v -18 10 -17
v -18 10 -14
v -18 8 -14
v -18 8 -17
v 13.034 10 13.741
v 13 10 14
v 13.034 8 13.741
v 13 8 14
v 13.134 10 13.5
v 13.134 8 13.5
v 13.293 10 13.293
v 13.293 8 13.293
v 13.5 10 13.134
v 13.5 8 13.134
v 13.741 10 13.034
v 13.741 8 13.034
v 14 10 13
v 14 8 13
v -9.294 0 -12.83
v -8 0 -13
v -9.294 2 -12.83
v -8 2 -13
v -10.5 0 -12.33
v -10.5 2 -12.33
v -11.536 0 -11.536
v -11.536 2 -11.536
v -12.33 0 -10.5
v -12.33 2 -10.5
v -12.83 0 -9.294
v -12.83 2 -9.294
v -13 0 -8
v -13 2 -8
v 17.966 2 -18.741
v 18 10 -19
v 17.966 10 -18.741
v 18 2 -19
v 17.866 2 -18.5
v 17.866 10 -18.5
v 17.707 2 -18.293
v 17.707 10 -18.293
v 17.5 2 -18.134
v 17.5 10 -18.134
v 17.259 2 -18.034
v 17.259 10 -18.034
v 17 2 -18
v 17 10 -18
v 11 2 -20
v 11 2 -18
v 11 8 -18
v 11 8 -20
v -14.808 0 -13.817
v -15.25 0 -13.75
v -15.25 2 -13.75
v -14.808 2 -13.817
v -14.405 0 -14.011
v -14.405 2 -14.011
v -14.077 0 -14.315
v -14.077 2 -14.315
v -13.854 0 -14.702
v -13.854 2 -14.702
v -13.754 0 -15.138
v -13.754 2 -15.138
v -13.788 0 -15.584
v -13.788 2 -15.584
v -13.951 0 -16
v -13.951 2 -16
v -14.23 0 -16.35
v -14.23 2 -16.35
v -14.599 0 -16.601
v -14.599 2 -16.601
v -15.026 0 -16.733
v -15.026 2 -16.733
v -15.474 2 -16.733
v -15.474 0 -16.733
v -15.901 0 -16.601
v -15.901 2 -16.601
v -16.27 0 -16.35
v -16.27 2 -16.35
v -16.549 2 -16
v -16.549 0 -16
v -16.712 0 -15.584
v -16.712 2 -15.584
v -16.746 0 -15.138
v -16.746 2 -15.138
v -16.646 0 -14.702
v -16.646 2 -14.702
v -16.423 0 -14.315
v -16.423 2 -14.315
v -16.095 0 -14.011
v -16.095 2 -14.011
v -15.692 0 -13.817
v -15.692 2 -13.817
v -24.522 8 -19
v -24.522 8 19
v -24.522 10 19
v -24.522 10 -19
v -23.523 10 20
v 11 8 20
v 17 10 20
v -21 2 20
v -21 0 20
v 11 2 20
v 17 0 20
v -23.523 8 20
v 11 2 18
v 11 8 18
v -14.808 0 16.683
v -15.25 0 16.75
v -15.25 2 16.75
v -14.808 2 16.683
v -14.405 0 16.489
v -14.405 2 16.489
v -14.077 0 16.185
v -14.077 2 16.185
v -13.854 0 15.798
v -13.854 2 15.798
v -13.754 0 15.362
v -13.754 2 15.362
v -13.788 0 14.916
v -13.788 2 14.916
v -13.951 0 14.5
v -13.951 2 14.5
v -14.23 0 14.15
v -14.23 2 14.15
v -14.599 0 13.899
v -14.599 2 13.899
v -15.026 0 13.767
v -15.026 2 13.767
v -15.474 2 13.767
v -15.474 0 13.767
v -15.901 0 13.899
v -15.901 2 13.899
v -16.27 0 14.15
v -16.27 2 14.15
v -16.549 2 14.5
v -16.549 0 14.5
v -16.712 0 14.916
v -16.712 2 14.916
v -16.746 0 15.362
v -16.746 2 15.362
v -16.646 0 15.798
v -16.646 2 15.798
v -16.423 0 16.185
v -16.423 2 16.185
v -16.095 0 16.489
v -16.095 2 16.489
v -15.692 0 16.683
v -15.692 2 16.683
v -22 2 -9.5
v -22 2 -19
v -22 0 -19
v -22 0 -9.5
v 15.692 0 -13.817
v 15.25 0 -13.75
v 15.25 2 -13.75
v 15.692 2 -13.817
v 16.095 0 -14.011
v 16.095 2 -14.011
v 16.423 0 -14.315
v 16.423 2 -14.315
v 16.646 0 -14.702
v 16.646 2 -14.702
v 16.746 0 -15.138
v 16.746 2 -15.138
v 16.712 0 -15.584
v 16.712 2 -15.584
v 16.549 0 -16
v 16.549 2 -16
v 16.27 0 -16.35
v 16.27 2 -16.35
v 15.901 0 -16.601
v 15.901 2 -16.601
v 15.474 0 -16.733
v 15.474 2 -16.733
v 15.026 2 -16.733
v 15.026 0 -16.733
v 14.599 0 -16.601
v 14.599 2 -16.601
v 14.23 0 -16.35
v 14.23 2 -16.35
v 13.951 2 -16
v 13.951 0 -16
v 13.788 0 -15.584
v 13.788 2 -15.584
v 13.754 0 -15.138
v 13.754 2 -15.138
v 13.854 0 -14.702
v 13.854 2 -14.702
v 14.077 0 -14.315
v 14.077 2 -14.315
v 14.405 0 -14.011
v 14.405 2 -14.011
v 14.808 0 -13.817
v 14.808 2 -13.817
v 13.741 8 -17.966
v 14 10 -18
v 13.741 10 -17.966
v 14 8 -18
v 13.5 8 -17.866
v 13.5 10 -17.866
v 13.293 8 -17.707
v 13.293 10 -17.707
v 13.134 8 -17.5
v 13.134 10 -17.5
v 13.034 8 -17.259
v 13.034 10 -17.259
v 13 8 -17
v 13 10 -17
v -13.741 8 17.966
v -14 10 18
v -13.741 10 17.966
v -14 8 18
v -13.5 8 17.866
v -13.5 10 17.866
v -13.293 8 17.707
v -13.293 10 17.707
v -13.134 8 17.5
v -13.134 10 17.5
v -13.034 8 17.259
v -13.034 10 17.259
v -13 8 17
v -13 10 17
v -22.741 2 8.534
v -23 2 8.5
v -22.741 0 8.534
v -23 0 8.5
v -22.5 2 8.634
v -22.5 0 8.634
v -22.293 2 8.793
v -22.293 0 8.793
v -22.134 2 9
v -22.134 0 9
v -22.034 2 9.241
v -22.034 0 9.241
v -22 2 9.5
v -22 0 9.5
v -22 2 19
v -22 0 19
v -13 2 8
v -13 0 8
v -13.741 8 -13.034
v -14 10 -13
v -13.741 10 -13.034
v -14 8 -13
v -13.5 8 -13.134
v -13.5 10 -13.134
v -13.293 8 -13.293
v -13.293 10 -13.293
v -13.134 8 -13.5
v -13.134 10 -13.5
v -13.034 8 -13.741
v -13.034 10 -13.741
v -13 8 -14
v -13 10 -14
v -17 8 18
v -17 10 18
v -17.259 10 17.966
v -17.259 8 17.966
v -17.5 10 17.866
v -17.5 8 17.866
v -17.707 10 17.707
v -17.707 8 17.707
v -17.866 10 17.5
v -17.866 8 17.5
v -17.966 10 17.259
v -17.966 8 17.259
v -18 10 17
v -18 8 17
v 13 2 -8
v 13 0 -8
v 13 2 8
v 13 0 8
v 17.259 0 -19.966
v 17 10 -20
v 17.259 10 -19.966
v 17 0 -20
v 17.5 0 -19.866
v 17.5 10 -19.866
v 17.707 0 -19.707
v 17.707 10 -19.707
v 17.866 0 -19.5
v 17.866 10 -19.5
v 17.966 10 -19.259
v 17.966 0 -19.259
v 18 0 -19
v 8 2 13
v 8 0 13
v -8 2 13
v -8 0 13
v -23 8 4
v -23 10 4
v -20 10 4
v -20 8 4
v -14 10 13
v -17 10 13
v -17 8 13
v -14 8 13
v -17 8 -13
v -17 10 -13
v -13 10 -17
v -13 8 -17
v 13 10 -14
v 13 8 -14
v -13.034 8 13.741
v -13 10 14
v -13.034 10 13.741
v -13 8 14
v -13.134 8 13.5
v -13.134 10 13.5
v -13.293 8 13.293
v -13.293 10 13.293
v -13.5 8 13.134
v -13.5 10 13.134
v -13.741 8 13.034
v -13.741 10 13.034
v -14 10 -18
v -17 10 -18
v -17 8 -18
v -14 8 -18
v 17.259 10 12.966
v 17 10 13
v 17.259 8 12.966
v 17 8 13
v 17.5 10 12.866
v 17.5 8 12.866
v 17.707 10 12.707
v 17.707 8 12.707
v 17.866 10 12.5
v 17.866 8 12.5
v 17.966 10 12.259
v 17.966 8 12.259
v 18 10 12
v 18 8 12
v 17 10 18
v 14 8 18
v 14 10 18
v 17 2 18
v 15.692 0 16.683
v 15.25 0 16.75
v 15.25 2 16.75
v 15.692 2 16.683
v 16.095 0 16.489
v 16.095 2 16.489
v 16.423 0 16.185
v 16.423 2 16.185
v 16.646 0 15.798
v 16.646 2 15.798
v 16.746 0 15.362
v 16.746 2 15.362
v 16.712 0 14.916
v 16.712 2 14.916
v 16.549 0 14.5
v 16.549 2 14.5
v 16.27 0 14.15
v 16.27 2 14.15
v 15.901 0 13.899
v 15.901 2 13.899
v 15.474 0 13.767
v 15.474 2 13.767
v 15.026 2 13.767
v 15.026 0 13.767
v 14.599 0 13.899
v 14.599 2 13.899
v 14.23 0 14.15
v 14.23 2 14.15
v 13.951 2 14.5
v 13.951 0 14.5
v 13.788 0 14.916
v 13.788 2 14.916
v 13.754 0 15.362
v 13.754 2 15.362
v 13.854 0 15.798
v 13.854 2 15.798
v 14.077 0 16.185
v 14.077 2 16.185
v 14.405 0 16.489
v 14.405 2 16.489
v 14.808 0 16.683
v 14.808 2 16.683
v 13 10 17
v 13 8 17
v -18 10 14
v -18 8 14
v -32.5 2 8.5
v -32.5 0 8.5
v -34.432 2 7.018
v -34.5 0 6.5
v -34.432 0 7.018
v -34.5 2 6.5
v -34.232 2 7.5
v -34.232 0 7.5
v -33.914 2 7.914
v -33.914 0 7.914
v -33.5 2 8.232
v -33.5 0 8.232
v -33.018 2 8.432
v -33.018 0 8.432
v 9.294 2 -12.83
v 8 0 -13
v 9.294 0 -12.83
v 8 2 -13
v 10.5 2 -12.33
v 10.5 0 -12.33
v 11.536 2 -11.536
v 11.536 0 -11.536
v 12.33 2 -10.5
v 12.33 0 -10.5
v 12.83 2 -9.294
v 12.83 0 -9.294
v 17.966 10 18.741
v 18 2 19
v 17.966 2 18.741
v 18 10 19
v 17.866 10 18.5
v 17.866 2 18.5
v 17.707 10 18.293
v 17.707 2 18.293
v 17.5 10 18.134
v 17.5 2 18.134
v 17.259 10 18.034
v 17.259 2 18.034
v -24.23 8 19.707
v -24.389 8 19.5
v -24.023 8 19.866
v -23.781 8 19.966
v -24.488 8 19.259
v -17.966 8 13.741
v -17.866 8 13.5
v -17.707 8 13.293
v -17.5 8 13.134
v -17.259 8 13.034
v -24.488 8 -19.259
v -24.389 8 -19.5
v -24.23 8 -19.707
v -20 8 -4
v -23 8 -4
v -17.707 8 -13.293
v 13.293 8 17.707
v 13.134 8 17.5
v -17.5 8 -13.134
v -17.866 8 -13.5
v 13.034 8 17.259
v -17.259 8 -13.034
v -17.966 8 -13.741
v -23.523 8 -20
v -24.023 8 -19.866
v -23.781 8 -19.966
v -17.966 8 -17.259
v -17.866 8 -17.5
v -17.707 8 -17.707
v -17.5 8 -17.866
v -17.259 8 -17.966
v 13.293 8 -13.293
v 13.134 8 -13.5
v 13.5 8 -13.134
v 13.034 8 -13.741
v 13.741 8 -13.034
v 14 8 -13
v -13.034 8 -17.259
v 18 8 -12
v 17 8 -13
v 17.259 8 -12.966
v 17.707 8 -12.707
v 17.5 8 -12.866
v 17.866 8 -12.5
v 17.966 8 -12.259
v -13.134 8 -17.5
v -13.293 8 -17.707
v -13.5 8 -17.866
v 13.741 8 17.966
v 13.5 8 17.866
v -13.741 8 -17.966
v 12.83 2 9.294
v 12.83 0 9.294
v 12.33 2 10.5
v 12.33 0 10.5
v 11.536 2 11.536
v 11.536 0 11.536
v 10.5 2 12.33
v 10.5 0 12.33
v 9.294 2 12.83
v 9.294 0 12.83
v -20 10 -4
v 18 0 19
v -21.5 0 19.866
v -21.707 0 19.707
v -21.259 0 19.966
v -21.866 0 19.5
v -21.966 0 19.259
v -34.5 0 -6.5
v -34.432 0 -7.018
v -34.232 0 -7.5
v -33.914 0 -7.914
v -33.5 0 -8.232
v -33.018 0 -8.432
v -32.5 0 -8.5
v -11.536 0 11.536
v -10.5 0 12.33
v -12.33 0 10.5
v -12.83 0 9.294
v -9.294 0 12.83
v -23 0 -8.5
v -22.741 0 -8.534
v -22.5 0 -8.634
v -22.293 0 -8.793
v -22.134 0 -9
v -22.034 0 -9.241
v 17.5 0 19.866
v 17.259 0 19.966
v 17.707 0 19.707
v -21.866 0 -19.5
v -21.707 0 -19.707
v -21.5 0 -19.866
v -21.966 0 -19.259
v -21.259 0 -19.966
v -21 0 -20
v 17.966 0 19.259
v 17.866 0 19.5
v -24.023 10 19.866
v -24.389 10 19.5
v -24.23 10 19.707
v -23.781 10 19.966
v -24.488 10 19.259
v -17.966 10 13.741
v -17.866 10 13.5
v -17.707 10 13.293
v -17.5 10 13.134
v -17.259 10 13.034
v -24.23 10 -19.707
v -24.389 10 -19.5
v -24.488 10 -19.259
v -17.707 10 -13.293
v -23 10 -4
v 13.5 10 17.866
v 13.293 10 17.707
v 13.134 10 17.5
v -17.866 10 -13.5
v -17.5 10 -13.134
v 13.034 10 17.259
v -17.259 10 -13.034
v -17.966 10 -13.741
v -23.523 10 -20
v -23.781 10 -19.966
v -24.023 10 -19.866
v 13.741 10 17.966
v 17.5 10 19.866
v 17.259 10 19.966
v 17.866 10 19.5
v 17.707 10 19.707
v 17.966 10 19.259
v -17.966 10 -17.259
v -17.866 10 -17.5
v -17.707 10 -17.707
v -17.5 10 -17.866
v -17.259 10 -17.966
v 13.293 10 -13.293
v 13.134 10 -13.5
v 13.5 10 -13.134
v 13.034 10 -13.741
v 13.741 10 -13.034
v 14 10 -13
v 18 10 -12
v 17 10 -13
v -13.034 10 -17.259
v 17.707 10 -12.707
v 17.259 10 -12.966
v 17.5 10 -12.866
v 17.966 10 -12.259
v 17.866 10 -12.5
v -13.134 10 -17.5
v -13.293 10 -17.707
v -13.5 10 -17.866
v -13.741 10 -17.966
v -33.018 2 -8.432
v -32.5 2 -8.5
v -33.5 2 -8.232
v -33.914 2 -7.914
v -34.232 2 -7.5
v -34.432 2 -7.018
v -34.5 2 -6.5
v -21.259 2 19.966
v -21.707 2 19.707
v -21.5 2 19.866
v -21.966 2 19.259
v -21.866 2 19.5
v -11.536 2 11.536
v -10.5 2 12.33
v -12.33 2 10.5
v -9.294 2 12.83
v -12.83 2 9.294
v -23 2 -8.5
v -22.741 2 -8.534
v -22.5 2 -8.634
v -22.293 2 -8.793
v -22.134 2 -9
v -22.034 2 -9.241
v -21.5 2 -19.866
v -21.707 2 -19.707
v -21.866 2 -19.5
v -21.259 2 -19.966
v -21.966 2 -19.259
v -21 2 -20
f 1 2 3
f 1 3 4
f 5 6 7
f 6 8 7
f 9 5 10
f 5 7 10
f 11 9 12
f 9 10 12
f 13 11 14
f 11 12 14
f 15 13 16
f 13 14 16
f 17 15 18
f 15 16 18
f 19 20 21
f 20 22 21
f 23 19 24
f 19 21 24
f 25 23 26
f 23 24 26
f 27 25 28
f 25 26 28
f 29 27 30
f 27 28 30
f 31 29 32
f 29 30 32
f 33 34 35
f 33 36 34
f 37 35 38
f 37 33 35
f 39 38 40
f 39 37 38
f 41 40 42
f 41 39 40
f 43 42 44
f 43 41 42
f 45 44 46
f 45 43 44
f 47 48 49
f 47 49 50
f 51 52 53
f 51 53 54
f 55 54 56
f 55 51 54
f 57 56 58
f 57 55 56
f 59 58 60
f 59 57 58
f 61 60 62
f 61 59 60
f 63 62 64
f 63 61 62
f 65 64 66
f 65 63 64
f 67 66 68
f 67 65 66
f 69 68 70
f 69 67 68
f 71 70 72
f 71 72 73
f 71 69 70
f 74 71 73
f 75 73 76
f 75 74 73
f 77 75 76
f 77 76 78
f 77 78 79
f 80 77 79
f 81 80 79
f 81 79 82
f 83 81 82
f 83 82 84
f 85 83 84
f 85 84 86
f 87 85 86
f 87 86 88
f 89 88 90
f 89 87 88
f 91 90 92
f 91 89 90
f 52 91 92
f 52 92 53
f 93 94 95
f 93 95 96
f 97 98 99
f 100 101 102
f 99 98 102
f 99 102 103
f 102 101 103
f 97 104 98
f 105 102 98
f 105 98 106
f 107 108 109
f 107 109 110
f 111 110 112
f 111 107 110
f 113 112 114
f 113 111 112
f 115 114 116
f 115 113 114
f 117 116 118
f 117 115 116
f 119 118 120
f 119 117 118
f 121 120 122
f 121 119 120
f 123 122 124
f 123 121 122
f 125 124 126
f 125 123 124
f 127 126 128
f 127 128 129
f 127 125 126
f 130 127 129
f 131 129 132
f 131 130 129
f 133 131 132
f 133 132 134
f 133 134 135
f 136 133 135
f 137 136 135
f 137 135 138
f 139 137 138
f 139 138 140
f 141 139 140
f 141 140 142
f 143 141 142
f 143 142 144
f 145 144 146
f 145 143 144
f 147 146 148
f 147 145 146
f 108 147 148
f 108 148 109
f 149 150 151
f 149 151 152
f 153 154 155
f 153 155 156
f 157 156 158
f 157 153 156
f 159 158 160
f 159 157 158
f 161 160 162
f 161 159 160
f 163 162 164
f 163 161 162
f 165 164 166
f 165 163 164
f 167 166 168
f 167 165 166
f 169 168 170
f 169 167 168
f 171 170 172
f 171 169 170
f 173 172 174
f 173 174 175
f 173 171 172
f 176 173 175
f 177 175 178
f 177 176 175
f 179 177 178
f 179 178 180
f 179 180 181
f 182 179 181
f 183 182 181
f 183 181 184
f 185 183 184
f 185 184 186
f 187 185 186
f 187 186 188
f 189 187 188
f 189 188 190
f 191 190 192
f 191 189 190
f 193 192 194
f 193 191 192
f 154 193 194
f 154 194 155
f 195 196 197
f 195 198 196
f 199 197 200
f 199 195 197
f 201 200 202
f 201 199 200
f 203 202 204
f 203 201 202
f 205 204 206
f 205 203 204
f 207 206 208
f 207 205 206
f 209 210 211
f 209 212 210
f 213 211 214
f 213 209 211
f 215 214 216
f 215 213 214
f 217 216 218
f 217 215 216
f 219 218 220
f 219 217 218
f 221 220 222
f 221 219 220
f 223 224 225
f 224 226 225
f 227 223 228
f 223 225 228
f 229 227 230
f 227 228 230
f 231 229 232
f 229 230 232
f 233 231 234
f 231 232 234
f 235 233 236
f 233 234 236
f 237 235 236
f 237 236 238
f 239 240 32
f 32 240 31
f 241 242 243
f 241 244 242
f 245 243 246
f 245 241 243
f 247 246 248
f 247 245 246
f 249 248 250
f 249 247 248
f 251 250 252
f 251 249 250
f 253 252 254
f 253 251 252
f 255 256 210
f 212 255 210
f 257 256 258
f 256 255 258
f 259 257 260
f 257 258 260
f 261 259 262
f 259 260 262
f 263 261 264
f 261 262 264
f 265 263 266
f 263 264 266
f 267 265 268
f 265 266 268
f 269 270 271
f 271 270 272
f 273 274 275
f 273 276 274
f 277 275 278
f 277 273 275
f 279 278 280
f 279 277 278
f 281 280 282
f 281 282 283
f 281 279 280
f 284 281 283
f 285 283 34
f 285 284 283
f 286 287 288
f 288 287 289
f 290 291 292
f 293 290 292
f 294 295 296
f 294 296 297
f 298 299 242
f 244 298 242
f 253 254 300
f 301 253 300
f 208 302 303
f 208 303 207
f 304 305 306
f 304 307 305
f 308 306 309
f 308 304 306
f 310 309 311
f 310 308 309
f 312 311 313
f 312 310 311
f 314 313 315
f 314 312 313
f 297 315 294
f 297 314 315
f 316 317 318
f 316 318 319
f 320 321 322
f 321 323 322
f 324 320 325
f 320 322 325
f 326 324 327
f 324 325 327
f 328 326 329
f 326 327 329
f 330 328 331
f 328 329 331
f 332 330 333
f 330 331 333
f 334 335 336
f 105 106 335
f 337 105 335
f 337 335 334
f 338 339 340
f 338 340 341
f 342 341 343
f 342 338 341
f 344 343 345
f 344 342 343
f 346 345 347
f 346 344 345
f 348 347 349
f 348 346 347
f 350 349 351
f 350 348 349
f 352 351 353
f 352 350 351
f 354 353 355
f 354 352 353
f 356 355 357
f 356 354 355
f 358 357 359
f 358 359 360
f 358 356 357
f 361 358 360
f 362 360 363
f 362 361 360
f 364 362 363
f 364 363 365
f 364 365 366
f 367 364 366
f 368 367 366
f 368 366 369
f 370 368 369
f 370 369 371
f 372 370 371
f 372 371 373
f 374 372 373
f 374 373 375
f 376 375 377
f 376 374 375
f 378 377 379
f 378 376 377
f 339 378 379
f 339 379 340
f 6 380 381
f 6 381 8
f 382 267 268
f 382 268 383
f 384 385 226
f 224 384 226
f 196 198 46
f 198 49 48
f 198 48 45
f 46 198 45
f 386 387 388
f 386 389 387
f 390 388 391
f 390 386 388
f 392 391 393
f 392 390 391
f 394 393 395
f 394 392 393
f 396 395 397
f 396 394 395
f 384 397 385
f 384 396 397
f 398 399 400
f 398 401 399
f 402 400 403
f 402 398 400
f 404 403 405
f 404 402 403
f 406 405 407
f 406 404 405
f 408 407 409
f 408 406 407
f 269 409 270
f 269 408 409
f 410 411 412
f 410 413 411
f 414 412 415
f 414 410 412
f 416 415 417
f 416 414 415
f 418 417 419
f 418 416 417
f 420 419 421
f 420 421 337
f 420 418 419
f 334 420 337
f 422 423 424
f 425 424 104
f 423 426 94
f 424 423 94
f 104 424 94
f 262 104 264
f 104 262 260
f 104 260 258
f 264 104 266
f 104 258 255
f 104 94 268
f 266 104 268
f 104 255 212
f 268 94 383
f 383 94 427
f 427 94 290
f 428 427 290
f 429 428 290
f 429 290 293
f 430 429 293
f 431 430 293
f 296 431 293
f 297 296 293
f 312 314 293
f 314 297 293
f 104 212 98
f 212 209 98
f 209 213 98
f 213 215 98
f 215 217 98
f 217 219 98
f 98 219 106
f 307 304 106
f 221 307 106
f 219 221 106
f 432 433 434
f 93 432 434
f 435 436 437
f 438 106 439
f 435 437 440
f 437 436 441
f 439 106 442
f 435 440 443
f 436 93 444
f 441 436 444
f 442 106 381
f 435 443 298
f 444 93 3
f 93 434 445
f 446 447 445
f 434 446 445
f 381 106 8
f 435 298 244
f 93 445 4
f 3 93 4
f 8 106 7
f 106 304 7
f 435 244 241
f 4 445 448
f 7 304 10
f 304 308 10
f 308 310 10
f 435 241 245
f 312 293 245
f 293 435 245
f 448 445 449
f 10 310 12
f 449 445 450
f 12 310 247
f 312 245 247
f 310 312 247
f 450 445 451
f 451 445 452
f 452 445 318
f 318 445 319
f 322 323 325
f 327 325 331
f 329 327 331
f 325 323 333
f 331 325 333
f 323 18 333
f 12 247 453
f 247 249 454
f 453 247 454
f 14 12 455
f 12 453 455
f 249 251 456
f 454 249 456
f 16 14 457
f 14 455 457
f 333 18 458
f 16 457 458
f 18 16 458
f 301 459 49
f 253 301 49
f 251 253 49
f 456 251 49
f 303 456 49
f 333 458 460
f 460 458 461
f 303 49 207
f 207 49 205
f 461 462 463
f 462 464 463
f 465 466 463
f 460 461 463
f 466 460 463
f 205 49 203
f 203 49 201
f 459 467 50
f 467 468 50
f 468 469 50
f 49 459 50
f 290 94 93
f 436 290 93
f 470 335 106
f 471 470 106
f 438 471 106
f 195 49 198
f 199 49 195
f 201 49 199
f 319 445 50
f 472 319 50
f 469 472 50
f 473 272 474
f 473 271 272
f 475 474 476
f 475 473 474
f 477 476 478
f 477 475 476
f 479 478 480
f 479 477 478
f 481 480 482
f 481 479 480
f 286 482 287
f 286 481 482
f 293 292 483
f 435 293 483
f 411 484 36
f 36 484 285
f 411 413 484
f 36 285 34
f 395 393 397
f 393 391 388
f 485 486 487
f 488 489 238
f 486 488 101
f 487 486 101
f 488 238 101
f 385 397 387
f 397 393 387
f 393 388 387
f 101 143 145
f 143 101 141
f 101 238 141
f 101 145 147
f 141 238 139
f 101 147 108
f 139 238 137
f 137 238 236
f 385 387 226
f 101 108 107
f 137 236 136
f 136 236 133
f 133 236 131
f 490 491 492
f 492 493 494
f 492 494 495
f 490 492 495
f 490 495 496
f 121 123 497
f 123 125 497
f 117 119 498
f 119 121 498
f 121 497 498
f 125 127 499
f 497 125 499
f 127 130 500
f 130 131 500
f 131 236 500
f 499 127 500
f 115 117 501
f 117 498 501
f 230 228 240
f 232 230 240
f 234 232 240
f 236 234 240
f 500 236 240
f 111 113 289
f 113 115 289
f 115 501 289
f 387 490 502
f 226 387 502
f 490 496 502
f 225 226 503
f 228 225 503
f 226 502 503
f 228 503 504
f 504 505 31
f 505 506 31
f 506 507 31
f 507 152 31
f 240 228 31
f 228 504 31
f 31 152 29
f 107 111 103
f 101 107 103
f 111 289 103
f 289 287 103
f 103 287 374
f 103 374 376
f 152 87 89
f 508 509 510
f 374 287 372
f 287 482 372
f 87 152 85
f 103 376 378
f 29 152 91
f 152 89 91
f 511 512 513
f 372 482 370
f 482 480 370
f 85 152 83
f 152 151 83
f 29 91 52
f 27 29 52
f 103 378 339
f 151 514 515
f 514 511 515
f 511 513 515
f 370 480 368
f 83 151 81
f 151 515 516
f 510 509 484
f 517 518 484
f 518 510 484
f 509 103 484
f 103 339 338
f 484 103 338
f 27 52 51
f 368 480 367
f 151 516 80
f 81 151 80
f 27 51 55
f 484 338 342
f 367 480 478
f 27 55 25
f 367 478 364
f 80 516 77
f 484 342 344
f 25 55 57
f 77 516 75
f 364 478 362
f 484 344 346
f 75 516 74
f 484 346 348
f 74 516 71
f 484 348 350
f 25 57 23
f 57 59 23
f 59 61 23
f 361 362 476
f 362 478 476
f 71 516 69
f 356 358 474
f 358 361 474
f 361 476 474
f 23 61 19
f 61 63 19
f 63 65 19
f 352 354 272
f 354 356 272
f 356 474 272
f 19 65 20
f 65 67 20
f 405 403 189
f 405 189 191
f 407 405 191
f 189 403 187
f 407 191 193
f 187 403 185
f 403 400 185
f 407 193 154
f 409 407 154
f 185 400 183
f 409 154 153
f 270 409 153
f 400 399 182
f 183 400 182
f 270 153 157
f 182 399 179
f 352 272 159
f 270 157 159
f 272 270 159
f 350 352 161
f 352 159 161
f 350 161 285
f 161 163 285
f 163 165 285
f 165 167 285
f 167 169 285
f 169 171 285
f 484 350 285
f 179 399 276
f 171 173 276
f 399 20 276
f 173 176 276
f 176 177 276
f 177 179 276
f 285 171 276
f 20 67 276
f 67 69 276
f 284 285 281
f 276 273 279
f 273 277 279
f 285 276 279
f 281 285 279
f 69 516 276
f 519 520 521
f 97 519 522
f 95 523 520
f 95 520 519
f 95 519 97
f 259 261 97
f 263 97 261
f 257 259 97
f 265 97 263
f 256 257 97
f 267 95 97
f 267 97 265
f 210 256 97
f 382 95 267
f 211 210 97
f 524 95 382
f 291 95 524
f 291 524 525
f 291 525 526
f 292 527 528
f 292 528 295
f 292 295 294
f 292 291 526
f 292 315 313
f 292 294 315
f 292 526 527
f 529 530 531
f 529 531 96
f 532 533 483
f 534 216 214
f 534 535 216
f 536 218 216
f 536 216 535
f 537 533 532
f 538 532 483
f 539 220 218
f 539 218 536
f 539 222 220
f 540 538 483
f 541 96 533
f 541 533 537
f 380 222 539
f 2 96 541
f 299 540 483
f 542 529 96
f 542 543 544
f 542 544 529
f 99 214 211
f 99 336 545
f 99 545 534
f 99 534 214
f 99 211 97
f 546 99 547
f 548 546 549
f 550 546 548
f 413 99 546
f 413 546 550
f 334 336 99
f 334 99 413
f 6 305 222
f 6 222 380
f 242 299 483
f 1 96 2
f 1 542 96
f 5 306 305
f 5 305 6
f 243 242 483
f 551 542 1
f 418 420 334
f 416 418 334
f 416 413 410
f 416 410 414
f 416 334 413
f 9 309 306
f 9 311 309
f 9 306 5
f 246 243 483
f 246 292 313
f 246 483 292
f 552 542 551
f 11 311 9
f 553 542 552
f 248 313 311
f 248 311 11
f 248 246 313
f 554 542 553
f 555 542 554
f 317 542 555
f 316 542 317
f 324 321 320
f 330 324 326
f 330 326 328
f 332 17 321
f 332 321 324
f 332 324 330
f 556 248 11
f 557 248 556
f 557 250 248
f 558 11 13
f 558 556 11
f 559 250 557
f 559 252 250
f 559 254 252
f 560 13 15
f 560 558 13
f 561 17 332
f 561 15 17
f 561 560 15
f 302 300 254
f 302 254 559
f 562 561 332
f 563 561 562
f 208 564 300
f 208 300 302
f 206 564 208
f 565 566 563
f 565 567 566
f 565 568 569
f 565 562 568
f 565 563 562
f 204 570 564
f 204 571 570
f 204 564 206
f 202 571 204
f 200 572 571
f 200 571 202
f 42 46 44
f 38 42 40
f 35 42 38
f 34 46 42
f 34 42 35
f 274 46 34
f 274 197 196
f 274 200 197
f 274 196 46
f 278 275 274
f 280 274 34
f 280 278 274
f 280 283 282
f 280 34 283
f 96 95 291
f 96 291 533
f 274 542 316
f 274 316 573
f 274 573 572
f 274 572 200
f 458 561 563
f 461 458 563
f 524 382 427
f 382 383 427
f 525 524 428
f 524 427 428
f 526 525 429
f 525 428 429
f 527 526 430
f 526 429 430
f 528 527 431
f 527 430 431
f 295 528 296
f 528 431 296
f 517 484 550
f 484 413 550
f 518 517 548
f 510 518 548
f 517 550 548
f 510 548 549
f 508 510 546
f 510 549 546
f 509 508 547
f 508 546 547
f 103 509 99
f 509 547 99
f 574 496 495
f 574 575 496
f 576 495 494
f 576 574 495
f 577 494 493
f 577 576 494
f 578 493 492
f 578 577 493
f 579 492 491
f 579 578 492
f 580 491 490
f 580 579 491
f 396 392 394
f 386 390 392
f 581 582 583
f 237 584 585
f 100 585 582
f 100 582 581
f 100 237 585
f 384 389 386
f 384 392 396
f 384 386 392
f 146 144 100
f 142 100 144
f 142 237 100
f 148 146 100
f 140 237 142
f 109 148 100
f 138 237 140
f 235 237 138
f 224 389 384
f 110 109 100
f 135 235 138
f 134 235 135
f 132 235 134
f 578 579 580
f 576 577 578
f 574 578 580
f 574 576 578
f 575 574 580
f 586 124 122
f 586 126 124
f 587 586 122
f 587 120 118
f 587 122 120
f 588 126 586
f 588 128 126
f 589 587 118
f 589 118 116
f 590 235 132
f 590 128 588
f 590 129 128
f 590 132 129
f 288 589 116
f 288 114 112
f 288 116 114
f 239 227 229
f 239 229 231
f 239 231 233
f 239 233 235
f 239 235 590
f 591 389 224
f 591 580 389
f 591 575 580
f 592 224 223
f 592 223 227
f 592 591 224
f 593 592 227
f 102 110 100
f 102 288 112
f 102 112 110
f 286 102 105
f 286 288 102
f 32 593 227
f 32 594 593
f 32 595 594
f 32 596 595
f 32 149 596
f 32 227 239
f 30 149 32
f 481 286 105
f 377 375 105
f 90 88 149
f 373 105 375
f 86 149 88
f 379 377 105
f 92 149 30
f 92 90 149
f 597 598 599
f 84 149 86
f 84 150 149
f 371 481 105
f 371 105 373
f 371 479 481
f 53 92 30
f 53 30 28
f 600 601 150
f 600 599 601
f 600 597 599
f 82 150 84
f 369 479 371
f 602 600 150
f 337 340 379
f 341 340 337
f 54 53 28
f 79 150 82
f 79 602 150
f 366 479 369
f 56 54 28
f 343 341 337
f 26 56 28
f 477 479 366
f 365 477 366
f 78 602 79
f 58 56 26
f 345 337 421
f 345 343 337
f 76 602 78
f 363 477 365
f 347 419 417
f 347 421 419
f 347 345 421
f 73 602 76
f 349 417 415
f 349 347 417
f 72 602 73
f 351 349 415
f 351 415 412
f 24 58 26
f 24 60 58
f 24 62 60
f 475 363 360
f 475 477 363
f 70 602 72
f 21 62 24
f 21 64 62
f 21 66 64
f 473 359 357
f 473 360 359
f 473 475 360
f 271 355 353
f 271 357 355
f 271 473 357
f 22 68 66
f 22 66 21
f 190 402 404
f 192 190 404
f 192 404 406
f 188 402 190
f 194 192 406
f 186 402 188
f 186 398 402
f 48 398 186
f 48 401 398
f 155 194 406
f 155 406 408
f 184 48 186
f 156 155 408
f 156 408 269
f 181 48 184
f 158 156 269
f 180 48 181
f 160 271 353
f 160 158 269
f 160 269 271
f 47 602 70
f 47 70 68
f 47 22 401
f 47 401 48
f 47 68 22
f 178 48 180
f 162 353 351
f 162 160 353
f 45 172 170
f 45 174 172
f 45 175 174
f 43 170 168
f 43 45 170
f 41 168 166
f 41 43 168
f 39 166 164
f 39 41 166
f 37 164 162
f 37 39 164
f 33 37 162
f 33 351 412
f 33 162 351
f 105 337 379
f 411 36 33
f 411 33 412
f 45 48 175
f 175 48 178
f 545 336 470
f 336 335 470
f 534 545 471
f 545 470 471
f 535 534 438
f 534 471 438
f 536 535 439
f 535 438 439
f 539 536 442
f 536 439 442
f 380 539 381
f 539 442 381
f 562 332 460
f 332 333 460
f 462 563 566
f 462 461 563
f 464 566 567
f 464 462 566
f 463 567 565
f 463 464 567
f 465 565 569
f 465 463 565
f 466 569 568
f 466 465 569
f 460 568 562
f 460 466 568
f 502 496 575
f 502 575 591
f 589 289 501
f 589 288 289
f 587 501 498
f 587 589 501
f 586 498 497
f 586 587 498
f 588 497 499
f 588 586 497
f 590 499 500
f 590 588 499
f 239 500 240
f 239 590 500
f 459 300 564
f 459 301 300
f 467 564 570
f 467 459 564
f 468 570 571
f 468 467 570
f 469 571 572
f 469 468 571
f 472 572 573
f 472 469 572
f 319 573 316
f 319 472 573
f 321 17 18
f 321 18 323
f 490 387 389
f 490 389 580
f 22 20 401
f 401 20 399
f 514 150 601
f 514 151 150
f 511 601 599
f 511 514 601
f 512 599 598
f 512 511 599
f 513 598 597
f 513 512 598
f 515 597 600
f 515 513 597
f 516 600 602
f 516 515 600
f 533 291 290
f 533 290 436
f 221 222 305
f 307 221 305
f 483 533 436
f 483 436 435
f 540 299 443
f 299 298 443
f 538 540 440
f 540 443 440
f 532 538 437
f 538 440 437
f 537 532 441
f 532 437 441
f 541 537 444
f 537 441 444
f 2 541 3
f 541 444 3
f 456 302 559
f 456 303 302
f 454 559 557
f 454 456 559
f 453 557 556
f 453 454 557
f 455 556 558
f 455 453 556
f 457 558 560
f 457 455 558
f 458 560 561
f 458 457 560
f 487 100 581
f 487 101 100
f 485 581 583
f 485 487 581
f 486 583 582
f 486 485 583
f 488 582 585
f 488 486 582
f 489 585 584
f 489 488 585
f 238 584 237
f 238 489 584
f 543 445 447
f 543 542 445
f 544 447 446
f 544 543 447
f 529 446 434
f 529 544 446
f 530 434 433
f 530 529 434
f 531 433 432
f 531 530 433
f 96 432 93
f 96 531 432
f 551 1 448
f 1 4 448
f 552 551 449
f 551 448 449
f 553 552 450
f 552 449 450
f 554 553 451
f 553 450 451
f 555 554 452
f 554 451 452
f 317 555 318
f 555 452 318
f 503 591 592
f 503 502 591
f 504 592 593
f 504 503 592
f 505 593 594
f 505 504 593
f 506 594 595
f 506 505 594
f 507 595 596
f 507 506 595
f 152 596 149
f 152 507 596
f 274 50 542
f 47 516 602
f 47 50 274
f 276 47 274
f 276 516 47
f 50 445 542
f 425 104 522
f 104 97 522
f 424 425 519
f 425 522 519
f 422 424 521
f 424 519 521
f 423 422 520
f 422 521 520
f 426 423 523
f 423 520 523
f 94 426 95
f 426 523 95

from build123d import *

# Parameters (mm, degrees)
CROQUIS1_W              = 16.5
CROQUIS1_H              = 17
CROQUIS1_R              = 1.5
CROQUIS1_W_2            = 5
SALIENTE_EXTRUIR1_DEPTH = 2
SALIENTE_EXTRUIR2_DEPTH = 2
CROQUIS4_W              = 7
CROQUIS4_H              = 2
SALIENTE_EXTRUIR3_DEPTH = 6
CROQUIS7_W              = 42.522469992
CROQUIS7_H              = 40
SALIENTE_EXTRUIR5_DEPTH = 2
CORTAR_EXTRUIR1_REACH   = 43.113
CROQUIS8_W              = 5
CROQUIS8_H              = 5
REDONDEO1_R             = 5
REDONDEO2_R             = 2
CORTAR_EXTRUIR3_REACH   = 43.113
CROQUIS12_W             = 3
CROQUIS12_H             = 8
REDONDEO3_R             = 1


with BuildPart() as part:
    # Croquis1 → Saliente-Extruir1 (new body)
    # profile 1 of 3: a face of its own
    with BuildSketch(Plane(origin=(0, 0, 0), x_dir=(1, 0, 0), z_dir=(0, 1, 0))):
        with Locations((-26.25, 0)):
            Rectangle(CROQUIS1_W, CROQUIS1_H)
    # profile 2 of 3: a face of its own
    with BuildSketch(Plane(origin=(0, 0, 0), x_dir=(1, 0, 0), z_dir=(0, 1, 0))):
        Polygon((13, -13), (-13, -13), (-13, -8.5), (-18, -8.5), (-18, -18), (18, -18), (18, 18), (-18, 18), (-18, 8.5), (-13, 8.5), (-13, 13), (13, 13), align=None)
        with Locations(Location((-15.25, -15.25, 0), (0, 0, 270))):
            Circle(CROQUIS1_R, mode=Mode.SUBTRACT)
        with Locations(Location((15.25, -15.25, 0), (0, 0, 270))):
            Circle(CROQUIS1_R, mode=Mode.SUBTRACT)
        with Locations(Location((-15.25, 15.25, 0), (0, 0, 270))):
            Circle(CROQUIS1_R, mode=Mode.SUBTRACT)
        with Locations(Location((15.25, 15.25, 0), (0, 0, 270))):
            Circle(CROQUIS1_R, mode=Mode.SUBTRACT)
    # profile 3 of 3: a face of its own
    with BuildSketch(Plane(origin=(0, 0, 0), x_dir=(1, 0, 0), z_dir=(0, 1, 0))):
        with Locations((-15.5, 0)):
            Rectangle(CROQUIS1_W_2, CROQUIS1_H)
    extrude(amount=SALIENTE_EXTRUIR1_DEPTH)

    # Croquis2 → Saliente-Extruir2 (add)
    with BuildSketch(Plane(origin=(0, 2, 0), x_dir=(1, 0, 0), z_dir=(0, 1, 0))):
        Polygon((18, 18), (18, 20), (-22, 20), (-22, 8.5), (-18, 8.5), (-18, 18), align=None)
        Polygon((18, -20), (18, -18), (-18, -18), (-18, -8.5), (-22, -8.5), (-22, -20), align=None)
    extrude(amount=-SALIENTE_EXTRUIR2_DEPTH)

    # Croquis4 → Saliente-Extruir3 (add)
    with BuildSketch(Plane(origin=(0, 2, 0), x_dir=(1, 0, 0), z_dir=(0, 1, 0))):
        with Locations((14.5, -19)):
            Rectangle(CROQUIS4_W, CROQUIS4_H)
        with Locations((14.5, 19)):
            Rectangle(CROQUIS4_W, CROQUIS4_H)
    extrude(amount=SALIENTE_EXTRUIR3_DEPTH)

    # Croquis7 → Saliente-Extruir5 (add)
    with BuildSketch(Plane(origin=(0, 8, 0), x_dir=(1, 0, 0), z_dir=(0, 1, 0))):
        with Locations((-3.261234996, 0)):
            Rectangle(CROQUIS7_W, CROQUIS7_H)
    extrude(amount=SALIENTE_EXTRUIR5_DEPTH)

    # Croquis8 → Cortar-Extruir1 (cut, up to next)
    with BuildSketch(Plane(origin=(0, 10, 0), x_dir=(1, 0, 0), z_dir=(0, 1, 0)), mode=Mode.PRIVATE) as cortar_extruir1_sk1:
        with Locations((15.5, -15.5)):
            Rectangle(CROQUIS8_W, CROQUIS8_H)
    cortar_extruir1_tool1 = extrude(cortar_extruir1_sk1.sketch, amount=-CORTAR_EXTRUIR1_REACH, mode=Mode.PRIVATE) & part.part
    # Croquis8 → Cortar-Extruir1 (cut, up to next)
    with BuildSketch(Plane(origin=(0, 10, 0), x_dir=(1, 0, 0), z_dir=(0, 1, 0)), mode=Mode.PRIVATE) as cortar_extruir1_sk2:
        with Locations((15.5, 15.5)):
            Rectangle(CROQUIS8_W, CROQUIS8_H)
    cortar_extruir1_tool2 = extrude(cortar_extruir1_sk2.sketch, amount=-CORTAR_EXTRUIR1_REACH, mode=Mode.PRIVATE) & part.part
    # Croquis8 → Cortar-Extruir1 (cut, up to next)
    with BuildSketch(Plane(origin=(0, 10, 0), x_dir=(1, 0, 0), z_dir=(0, 1, 0)), mode=Mode.PRIVATE) as cortar_extruir1_sk3:
        with Locations((-15.5, 15.5)):
            Rectangle(CROQUIS8_W, CROQUIS8_H)
    cortar_extruir1_tool3 = extrude(cortar_extruir1_sk3.sketch, amount=-CORTAR_EXTRUIR1_REACH, mode=Mode.PRIVATE) & part.part
    # Croquis8 → Cortar-Extruir1 (cut, up to next)
    with BuildSketch(Plane(origin=(0, 10, 0), x_dir=(1, 0, 0), z_dir=(0, 1, 0)), mode=Mode.PRIVATE) as cortar_extruir1_sk4:
        with Locations((-15.5, -15.5)):
            Rectangle(CROQUIS8_W, CROQUIS8_H)
    cortar_extruir1_tool4 = extrude(cortar_extruir1_sk4.sketch, amount=-CORTAR_EXTRUIR1_REACH, mode=Mode.PRIVATE) & part.part
    add(cortar_extruir1_tool1.solids().sort_by_distance((15.5, 10, 15.5))[0], mode=Mode.SUBTRACT)
    add(cortar_extruir1_tool2.solids().sort_by_distance((15.5, 10, -15.5))[0], mode=Mode.SUBTRACT)
    add(cortar_extruir1_tool3.solids().sort_by_distance((-15.5, 10, -15.5))[0], mode=Mode.SUBTRACT)
    add(cortar_extruir1_tool4.solids().sort_by_distance((-15.5, 10, 15.5))[0], mode=Mode.SUBTRACT)

    # Redondeo1
    redondeo1_edges = [part.edges().sort_by_distance(p)[0] for p in [
        (-13, 1, 13),
        (13, 1, 13),
        (13, 1, -13),
        (-13, 1, -13),
    ]]
    fillet(redondeo1_edges, radius=REDONDEO1_R)

    # Redondeo2
    redondeo2_edges = [part.edges().sort_by_distance(p)[0] for p in [
        (-34.5, 1, 8.5),
        (-34.5, 1, -8.5),
    ]]
    fillet(redondeo2_edges, radius=REDONDEO2_R)

    # Croquis12 → Cortar-Extruir3 (cut, up to next)
    with BuildSketch(Plane(origin=(0, 10, 0), x_dir=(1, 0, 0), z_dir=(0, 1, 0)), mode=Mode.PRIVATE) as cortar_extruir3_sk1:
        with Locations((-21.5, 0)):
            Rectangle(CROQUIS12_W, CROQUIS12_H)
    cortar_extruir3_tool1 = extrude(cortar_extruir3_sk1.sketch, amount=-CORTAR_EXTRUIR3_REACH, mode=Mode.PRIVATE) & part.part
    add(cortar_extruir3_tool1.solids().sort_by_distance((-21.5, 10, 0))[0], mode=Mode.SUBTRACT)

    # Redondeo3
    redondeo3_edges = [part.edges().sort_by_distance(p)[0] for p in [
        (-24.522469992, 9, -20),
        (-24.522469992, 9, 20),
        (-18, 9, 13),
        (-18, 9, 18),
        (-13, 9, 18),
        (-13, 9, 13),
        (-18, 9, -18),
        (-18, 9, -13),
        (-13, 9, -13),
        (-13, 9, -18),
        (18, 9, -13),
        (13, 9, -18),
        (13, 9, -13),
        (13, 9, 13),
        (13, 9, 18),
        (18, 9, 13),
        (-22, 1, -8.5),
        (18, 5, -20),
        (-22, 1, -20),
        (18, 5, 20),
        (-22, 1, 8.5),
        (-22, 1, 20),
        (18, 6, 18),
        (18, 6, -18),
    ]]
    fillet(redondeo3_edges, radius=REDONDEO3_R - 0.0001)  # a hair under: the kernel refuses the full size


solid = part.part
